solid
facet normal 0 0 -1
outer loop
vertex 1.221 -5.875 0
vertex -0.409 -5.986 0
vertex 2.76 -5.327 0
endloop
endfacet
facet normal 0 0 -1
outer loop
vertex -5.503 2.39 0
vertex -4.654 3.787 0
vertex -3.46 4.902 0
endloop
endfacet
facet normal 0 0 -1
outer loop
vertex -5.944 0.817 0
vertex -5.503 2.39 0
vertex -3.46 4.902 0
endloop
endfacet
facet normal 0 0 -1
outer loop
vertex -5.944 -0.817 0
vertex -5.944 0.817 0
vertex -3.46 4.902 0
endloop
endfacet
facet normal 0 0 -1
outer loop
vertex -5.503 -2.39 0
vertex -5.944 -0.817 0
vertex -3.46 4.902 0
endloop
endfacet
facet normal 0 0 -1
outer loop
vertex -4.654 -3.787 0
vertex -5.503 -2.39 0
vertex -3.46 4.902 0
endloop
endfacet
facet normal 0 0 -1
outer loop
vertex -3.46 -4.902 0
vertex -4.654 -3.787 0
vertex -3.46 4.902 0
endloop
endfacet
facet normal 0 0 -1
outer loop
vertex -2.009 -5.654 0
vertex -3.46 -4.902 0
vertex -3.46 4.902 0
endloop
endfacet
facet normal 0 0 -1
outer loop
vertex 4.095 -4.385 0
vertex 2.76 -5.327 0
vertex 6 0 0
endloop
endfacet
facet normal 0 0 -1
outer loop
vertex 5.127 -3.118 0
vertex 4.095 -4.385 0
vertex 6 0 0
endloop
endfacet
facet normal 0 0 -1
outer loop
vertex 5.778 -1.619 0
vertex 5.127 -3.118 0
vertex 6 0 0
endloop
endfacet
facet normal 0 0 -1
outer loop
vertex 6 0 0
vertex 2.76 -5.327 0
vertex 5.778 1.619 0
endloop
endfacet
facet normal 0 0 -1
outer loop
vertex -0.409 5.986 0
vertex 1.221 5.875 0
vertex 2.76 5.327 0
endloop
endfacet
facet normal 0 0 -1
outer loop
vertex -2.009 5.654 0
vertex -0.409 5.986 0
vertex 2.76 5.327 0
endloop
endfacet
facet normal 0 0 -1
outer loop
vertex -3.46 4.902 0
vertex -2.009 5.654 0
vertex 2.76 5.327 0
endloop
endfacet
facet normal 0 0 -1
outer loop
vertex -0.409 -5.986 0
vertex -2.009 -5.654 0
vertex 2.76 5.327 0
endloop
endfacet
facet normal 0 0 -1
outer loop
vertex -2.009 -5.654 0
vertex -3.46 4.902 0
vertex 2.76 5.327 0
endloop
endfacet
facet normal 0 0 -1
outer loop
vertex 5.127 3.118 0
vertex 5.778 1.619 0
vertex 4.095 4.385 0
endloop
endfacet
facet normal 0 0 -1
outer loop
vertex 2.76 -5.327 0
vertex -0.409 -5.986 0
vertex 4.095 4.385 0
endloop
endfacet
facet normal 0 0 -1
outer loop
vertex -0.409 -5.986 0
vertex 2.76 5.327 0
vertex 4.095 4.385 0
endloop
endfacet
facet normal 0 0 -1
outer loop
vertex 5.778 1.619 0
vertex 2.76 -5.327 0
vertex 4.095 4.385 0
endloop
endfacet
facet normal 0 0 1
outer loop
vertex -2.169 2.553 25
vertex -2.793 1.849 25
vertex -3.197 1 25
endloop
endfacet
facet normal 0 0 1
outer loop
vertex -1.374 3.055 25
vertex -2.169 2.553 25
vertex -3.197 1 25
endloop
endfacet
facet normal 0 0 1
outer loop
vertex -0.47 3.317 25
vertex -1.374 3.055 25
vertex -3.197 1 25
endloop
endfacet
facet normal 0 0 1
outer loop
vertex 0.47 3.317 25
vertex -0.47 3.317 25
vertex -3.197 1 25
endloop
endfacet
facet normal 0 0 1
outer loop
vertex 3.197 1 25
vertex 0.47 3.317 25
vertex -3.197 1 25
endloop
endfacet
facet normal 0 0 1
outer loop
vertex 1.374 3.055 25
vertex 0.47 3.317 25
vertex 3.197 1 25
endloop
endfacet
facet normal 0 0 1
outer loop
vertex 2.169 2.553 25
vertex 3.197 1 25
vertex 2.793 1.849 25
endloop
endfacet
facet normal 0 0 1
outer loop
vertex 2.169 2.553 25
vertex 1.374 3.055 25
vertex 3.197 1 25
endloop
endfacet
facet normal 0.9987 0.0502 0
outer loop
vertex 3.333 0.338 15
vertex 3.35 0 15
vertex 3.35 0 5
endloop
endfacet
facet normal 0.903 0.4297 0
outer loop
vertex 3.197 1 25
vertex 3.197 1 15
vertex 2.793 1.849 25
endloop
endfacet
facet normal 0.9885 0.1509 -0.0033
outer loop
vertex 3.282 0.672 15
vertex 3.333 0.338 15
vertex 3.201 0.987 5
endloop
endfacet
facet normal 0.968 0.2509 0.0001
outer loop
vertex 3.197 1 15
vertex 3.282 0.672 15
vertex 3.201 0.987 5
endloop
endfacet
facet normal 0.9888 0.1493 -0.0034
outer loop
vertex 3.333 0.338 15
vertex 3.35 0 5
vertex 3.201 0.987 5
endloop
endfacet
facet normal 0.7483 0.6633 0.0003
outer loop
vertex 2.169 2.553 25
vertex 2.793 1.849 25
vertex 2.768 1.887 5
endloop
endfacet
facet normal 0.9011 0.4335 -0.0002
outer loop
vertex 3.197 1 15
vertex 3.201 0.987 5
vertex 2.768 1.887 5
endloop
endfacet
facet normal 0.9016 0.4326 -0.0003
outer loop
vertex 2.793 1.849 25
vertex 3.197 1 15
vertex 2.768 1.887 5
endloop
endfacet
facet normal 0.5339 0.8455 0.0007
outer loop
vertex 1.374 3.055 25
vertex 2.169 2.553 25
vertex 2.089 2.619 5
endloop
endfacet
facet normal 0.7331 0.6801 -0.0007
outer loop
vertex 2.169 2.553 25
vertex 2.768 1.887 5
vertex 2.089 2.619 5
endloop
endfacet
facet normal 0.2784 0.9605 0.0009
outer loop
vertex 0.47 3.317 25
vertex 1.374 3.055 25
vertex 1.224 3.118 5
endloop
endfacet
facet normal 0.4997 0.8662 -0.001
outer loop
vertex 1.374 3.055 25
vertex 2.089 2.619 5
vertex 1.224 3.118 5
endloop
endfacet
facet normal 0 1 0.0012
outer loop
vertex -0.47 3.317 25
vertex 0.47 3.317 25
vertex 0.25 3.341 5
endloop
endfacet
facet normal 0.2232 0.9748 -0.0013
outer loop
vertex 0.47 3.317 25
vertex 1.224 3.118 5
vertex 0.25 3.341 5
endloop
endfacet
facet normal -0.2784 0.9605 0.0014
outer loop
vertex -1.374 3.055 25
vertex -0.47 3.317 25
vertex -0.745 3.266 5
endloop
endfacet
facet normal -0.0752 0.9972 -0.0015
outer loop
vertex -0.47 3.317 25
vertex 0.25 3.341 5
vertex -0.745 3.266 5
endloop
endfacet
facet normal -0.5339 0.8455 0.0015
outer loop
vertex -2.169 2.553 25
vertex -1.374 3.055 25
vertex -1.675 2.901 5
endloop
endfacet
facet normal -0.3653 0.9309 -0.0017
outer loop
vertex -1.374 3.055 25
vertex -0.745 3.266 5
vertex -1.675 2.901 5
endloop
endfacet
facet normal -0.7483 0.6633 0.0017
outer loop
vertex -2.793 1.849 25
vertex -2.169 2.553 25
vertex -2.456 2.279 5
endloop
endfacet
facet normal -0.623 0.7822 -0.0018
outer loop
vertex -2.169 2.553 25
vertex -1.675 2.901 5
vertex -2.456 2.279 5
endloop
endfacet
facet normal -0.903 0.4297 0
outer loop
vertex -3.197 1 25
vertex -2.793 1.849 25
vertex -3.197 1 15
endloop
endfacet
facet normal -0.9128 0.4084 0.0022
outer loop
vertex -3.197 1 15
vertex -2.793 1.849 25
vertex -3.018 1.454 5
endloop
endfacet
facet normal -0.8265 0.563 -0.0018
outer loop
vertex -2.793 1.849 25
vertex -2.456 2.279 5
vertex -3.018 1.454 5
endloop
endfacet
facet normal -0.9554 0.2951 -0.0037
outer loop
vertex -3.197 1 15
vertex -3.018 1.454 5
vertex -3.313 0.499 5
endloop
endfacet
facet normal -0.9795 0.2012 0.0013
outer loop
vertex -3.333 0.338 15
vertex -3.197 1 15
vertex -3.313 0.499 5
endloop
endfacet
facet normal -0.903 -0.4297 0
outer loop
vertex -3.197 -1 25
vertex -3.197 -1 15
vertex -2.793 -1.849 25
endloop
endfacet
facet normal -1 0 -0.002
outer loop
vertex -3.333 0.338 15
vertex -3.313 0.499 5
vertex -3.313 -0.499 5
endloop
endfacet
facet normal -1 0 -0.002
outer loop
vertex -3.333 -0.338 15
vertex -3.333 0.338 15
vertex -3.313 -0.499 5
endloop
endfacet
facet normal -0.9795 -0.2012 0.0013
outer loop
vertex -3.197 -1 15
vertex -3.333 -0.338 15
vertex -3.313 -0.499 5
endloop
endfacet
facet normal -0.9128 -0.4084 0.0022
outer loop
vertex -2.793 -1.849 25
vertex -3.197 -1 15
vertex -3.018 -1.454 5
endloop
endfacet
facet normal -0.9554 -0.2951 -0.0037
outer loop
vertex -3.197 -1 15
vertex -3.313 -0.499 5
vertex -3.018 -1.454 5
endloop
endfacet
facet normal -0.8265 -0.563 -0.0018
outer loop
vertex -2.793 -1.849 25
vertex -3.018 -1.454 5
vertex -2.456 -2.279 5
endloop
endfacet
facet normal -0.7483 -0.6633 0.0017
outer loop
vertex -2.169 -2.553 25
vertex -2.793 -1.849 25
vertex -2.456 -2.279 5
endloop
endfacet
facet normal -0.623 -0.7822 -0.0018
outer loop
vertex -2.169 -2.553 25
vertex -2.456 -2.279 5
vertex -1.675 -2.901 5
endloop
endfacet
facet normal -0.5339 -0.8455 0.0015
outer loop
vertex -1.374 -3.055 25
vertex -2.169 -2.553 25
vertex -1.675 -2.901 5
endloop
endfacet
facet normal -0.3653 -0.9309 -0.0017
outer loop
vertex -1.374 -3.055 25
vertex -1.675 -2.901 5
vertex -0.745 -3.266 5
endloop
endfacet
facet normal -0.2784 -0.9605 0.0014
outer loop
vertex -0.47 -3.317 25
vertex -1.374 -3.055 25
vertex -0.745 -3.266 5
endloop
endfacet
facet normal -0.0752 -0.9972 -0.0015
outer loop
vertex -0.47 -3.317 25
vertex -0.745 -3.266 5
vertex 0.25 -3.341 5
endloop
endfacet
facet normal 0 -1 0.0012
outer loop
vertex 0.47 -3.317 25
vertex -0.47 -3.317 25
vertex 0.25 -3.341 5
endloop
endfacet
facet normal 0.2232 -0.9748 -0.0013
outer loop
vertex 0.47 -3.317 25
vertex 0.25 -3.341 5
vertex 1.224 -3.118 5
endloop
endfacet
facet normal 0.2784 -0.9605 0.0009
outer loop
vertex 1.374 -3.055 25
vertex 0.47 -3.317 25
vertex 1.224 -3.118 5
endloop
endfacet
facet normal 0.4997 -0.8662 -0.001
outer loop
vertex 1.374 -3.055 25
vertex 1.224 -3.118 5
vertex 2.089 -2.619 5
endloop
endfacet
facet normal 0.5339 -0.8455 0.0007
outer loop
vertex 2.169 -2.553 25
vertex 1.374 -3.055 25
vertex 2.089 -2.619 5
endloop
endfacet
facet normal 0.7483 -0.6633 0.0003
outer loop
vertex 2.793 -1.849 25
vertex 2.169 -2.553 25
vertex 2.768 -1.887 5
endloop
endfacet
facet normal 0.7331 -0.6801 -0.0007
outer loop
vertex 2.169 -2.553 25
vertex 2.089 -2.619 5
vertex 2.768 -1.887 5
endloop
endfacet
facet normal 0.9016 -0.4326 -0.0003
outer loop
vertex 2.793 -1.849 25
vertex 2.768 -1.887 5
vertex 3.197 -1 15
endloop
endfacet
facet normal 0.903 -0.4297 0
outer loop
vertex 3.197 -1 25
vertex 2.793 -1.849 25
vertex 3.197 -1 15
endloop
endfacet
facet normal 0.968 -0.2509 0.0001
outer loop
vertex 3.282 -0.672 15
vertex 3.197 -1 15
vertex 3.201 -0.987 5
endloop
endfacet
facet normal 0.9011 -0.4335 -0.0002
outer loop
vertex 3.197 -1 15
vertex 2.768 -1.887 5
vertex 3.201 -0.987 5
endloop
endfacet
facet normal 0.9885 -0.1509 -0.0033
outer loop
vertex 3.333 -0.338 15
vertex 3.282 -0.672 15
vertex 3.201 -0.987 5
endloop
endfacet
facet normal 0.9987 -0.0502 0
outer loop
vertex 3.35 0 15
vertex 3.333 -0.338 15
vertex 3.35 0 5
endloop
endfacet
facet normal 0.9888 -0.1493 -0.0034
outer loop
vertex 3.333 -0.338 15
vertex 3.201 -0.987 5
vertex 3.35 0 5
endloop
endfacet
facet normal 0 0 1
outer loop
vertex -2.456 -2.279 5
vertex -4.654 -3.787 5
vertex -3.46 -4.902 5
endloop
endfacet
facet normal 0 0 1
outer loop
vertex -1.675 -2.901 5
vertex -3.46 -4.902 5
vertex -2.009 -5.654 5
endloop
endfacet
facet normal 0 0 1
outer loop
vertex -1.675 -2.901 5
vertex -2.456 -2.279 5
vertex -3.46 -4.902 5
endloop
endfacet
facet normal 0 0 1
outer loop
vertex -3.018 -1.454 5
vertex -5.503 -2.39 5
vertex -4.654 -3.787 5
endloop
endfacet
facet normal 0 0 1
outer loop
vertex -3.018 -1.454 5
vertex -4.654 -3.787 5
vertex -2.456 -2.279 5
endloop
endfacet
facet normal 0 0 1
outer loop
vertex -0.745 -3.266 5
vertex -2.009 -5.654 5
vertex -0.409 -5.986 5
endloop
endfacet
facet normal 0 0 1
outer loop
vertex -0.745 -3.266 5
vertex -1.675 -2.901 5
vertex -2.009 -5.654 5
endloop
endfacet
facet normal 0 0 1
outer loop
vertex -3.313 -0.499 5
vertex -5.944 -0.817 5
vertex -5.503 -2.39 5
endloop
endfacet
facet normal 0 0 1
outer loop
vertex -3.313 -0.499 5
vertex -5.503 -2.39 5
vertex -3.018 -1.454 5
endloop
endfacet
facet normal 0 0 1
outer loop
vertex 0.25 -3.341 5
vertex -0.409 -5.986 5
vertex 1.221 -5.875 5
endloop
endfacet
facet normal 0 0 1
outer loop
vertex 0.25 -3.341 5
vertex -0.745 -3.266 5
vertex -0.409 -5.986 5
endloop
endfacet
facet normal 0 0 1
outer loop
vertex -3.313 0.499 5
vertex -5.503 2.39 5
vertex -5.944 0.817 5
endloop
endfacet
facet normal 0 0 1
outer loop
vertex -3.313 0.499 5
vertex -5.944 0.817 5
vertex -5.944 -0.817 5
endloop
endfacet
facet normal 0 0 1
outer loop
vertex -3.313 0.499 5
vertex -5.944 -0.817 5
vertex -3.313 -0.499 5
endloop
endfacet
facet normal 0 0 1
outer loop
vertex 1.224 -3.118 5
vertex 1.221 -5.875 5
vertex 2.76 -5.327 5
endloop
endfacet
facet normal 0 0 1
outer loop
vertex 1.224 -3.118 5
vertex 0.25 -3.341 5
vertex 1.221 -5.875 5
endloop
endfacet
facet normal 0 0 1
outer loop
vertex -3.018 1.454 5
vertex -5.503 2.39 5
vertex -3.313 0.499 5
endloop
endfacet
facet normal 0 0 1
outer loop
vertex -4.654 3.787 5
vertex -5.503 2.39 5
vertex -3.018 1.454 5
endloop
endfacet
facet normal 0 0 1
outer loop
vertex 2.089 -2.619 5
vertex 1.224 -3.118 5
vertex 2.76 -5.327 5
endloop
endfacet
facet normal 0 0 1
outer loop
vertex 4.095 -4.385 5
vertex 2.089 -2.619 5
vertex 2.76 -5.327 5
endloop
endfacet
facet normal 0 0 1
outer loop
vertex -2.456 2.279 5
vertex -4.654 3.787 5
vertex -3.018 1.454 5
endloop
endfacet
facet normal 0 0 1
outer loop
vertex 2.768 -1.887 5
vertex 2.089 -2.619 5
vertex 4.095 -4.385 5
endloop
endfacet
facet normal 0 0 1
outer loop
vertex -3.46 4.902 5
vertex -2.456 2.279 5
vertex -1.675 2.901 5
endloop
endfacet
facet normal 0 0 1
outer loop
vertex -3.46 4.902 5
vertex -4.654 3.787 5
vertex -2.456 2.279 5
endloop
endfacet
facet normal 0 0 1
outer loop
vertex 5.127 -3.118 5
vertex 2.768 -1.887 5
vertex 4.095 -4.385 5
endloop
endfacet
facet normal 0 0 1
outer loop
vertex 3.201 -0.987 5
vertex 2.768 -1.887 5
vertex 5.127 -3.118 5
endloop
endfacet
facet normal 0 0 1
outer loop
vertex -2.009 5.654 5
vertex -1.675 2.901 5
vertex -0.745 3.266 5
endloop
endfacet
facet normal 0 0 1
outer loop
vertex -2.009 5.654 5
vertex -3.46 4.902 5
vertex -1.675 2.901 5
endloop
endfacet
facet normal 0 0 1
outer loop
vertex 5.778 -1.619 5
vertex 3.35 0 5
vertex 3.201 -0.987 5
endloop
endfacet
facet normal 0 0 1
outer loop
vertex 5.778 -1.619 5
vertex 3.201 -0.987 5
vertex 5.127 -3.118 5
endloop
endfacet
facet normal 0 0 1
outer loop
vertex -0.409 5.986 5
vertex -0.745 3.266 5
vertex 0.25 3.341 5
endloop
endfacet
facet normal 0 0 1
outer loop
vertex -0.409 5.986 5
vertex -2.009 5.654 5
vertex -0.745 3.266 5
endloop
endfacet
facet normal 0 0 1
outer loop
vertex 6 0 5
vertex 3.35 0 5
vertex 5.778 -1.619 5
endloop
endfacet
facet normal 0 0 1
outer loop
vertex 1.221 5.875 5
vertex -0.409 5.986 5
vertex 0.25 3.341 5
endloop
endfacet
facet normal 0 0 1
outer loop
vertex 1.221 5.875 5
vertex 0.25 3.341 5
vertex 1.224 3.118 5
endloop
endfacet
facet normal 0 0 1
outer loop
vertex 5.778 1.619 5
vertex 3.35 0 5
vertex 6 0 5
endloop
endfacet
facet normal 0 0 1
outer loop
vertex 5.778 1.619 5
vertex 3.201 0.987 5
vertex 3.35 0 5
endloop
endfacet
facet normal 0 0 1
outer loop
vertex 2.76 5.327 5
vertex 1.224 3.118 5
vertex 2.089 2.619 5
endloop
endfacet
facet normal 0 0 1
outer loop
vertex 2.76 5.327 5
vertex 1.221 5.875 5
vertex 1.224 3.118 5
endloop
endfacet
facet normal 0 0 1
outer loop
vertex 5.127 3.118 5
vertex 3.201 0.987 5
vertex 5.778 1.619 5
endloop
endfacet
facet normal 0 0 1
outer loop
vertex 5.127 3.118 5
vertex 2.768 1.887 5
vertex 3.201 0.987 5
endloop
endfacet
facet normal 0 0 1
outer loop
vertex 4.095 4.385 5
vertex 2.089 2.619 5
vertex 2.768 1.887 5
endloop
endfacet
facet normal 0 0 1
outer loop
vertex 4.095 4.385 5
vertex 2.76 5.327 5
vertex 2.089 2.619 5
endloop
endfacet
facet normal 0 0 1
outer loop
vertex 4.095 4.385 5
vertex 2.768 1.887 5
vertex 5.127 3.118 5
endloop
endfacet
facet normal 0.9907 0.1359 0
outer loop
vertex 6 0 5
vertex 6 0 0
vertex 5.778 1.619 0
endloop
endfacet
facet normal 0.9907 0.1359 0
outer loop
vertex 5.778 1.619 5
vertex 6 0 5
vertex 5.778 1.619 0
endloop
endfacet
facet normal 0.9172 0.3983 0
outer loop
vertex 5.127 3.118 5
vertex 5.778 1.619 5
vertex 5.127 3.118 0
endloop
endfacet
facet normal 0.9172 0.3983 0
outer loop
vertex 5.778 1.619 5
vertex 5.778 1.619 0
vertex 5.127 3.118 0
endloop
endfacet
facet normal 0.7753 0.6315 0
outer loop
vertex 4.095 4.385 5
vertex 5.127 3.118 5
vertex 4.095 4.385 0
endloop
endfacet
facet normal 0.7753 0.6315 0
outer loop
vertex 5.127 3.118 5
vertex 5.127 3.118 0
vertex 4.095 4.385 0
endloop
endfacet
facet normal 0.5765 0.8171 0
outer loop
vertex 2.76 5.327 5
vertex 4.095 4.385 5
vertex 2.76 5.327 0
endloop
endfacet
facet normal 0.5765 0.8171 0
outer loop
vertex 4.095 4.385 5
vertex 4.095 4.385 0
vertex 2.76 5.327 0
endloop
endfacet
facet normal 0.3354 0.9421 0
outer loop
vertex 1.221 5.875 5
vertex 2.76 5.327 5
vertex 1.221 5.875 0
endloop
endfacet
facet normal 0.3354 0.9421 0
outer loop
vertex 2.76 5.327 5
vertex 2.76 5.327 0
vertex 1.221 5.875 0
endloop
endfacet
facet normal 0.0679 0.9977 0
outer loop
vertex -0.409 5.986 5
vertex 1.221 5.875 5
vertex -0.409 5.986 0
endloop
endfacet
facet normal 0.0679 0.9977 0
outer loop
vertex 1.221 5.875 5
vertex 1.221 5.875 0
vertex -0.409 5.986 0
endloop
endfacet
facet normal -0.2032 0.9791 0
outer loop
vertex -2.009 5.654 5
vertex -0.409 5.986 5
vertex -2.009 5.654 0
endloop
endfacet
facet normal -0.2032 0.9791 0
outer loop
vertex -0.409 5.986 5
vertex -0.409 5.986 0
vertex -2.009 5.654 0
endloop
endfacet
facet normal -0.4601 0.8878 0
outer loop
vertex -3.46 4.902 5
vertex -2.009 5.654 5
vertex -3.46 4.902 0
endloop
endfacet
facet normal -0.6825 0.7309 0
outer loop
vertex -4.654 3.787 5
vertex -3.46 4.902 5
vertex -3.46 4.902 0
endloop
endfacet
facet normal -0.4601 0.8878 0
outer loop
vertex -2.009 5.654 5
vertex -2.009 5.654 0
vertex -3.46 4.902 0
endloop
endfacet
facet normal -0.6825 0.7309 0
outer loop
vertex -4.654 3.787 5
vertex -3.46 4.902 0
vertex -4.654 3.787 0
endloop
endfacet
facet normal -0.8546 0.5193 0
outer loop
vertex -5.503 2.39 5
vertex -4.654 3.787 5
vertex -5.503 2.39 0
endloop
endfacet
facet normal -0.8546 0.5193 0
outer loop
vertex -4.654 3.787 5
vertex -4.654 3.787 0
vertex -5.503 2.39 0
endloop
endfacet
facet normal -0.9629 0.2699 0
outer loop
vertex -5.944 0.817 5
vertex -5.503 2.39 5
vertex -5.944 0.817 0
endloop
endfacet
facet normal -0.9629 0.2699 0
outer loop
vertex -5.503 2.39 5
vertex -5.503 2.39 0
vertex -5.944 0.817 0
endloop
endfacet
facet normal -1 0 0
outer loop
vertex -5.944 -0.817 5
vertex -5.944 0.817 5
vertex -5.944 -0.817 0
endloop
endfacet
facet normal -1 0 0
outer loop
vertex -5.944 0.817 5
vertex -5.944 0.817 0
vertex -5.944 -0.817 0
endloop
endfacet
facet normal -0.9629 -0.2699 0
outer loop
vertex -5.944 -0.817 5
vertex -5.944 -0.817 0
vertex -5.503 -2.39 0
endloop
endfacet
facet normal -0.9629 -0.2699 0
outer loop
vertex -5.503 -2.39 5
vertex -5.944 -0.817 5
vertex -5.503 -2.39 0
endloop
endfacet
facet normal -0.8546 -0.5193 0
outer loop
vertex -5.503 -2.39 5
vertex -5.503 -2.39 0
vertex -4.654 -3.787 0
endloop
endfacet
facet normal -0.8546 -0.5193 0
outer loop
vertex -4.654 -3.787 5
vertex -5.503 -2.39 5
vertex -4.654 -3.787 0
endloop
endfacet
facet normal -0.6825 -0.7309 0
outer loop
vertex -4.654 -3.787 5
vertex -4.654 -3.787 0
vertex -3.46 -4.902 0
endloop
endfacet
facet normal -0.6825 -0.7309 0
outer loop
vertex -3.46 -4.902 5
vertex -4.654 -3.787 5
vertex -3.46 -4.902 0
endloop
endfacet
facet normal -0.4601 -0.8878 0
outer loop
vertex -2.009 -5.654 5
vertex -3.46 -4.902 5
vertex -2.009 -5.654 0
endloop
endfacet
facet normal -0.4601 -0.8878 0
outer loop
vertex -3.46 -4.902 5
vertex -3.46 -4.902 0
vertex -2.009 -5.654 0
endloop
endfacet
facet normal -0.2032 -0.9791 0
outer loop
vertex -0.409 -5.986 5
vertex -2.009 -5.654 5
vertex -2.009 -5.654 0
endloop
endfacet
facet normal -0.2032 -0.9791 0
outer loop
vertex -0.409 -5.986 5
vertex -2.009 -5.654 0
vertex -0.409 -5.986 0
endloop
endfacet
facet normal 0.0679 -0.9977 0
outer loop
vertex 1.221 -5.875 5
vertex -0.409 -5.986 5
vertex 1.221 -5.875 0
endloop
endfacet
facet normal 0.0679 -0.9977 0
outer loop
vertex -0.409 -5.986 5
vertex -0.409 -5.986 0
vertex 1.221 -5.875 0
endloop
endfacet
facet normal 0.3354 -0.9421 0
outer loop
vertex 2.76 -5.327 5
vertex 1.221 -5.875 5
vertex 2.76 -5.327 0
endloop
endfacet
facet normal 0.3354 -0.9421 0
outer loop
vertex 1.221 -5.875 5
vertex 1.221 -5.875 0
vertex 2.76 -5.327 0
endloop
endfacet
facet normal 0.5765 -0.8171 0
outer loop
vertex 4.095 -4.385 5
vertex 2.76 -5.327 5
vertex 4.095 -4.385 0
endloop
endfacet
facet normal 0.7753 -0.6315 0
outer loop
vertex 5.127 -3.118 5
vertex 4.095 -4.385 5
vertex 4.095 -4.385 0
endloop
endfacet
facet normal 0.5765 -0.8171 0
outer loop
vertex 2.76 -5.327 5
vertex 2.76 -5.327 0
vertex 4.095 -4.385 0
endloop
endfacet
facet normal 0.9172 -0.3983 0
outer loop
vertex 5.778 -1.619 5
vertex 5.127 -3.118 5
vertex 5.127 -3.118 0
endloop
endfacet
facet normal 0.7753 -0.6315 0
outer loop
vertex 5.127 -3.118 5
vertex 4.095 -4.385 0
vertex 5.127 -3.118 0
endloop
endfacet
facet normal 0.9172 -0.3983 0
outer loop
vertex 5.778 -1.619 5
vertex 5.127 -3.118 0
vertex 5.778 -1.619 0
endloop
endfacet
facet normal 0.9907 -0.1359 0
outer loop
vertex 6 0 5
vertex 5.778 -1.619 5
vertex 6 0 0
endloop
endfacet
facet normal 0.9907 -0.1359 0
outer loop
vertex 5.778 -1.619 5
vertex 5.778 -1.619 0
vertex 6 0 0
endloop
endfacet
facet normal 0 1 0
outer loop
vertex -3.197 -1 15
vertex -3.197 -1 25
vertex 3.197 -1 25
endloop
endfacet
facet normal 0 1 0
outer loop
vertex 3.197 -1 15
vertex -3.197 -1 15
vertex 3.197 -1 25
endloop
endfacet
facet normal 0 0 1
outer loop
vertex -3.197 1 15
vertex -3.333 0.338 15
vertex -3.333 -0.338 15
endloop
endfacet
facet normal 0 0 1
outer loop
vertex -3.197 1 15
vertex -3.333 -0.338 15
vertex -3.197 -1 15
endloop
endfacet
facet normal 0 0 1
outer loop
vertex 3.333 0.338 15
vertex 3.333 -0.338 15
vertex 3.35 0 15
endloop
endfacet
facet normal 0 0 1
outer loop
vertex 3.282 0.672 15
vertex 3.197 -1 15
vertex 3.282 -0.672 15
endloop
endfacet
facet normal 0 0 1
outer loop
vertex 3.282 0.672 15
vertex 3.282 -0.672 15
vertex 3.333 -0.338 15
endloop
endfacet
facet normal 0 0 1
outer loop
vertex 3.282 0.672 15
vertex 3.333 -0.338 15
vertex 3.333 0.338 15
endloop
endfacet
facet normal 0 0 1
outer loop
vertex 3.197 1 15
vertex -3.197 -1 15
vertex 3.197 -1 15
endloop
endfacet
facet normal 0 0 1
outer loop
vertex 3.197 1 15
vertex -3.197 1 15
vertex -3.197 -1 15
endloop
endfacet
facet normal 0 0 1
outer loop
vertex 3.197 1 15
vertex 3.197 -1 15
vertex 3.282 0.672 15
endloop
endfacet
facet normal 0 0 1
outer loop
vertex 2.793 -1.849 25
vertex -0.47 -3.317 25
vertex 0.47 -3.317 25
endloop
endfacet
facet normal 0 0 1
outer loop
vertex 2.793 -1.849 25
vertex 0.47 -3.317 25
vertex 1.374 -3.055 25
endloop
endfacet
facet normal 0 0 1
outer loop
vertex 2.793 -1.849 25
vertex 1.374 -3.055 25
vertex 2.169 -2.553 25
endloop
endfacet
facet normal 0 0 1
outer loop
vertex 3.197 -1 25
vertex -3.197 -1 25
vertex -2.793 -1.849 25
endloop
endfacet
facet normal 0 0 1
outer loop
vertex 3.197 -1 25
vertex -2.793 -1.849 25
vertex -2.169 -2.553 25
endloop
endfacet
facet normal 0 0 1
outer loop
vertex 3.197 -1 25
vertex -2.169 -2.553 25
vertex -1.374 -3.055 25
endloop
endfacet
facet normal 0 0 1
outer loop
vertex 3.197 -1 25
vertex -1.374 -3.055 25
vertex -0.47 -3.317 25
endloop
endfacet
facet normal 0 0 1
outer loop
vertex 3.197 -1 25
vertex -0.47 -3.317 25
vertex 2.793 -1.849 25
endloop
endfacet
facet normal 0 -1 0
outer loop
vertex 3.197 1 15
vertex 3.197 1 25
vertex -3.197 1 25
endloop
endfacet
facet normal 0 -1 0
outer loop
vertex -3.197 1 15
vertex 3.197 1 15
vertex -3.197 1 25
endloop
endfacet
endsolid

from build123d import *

# Parameters (mm, degrees)
F0_R     = 3.35
F1_DEPTH = 25
F0_R_2   = 6
F2_DEPTH = 5
F4_DEPTH = 10


with BuildPart() as f1:
    # F0 (on Top) → F1 (new body)
    with BuildSketch(Plane.XY):
        Circle(F0_R)
    extrude(amount=F1_DEPTH)

    # F0 (on Top) → F2 (join)
    with BuildSketch(Plane.XY):
        Circle(F0_R_2)
        Circle(F0_R, mode=Mode.SUBTRACT)
    extrude(amount=F2_DEPTH)

    # F3 (on face) → F4 (cut)
    with BuildSketch(Plane.XY.offset(25)):
        with BuildLine():
            ThreePointArc((-3.1972644557, 1), (-3.35, 0), (-3.1972644557, -1))
            Line((-3.1972644557, -1), (3.1972644557, -1))
            ThreePointArc((3.1972644557, -1), (3.3115959843, -0.505798415), (3.35, 0))
            ThreePointArc((3.35, 0), (3.3115959843, 0.505798415), (3.1972644557, 1))
            Line((3.1972644557, 1), (-3.1972644557, 1))
        make_face()
    extrude(amount=-F4_DEPTH, mode=Mode.SUBTRACT)


solid = f1.part
